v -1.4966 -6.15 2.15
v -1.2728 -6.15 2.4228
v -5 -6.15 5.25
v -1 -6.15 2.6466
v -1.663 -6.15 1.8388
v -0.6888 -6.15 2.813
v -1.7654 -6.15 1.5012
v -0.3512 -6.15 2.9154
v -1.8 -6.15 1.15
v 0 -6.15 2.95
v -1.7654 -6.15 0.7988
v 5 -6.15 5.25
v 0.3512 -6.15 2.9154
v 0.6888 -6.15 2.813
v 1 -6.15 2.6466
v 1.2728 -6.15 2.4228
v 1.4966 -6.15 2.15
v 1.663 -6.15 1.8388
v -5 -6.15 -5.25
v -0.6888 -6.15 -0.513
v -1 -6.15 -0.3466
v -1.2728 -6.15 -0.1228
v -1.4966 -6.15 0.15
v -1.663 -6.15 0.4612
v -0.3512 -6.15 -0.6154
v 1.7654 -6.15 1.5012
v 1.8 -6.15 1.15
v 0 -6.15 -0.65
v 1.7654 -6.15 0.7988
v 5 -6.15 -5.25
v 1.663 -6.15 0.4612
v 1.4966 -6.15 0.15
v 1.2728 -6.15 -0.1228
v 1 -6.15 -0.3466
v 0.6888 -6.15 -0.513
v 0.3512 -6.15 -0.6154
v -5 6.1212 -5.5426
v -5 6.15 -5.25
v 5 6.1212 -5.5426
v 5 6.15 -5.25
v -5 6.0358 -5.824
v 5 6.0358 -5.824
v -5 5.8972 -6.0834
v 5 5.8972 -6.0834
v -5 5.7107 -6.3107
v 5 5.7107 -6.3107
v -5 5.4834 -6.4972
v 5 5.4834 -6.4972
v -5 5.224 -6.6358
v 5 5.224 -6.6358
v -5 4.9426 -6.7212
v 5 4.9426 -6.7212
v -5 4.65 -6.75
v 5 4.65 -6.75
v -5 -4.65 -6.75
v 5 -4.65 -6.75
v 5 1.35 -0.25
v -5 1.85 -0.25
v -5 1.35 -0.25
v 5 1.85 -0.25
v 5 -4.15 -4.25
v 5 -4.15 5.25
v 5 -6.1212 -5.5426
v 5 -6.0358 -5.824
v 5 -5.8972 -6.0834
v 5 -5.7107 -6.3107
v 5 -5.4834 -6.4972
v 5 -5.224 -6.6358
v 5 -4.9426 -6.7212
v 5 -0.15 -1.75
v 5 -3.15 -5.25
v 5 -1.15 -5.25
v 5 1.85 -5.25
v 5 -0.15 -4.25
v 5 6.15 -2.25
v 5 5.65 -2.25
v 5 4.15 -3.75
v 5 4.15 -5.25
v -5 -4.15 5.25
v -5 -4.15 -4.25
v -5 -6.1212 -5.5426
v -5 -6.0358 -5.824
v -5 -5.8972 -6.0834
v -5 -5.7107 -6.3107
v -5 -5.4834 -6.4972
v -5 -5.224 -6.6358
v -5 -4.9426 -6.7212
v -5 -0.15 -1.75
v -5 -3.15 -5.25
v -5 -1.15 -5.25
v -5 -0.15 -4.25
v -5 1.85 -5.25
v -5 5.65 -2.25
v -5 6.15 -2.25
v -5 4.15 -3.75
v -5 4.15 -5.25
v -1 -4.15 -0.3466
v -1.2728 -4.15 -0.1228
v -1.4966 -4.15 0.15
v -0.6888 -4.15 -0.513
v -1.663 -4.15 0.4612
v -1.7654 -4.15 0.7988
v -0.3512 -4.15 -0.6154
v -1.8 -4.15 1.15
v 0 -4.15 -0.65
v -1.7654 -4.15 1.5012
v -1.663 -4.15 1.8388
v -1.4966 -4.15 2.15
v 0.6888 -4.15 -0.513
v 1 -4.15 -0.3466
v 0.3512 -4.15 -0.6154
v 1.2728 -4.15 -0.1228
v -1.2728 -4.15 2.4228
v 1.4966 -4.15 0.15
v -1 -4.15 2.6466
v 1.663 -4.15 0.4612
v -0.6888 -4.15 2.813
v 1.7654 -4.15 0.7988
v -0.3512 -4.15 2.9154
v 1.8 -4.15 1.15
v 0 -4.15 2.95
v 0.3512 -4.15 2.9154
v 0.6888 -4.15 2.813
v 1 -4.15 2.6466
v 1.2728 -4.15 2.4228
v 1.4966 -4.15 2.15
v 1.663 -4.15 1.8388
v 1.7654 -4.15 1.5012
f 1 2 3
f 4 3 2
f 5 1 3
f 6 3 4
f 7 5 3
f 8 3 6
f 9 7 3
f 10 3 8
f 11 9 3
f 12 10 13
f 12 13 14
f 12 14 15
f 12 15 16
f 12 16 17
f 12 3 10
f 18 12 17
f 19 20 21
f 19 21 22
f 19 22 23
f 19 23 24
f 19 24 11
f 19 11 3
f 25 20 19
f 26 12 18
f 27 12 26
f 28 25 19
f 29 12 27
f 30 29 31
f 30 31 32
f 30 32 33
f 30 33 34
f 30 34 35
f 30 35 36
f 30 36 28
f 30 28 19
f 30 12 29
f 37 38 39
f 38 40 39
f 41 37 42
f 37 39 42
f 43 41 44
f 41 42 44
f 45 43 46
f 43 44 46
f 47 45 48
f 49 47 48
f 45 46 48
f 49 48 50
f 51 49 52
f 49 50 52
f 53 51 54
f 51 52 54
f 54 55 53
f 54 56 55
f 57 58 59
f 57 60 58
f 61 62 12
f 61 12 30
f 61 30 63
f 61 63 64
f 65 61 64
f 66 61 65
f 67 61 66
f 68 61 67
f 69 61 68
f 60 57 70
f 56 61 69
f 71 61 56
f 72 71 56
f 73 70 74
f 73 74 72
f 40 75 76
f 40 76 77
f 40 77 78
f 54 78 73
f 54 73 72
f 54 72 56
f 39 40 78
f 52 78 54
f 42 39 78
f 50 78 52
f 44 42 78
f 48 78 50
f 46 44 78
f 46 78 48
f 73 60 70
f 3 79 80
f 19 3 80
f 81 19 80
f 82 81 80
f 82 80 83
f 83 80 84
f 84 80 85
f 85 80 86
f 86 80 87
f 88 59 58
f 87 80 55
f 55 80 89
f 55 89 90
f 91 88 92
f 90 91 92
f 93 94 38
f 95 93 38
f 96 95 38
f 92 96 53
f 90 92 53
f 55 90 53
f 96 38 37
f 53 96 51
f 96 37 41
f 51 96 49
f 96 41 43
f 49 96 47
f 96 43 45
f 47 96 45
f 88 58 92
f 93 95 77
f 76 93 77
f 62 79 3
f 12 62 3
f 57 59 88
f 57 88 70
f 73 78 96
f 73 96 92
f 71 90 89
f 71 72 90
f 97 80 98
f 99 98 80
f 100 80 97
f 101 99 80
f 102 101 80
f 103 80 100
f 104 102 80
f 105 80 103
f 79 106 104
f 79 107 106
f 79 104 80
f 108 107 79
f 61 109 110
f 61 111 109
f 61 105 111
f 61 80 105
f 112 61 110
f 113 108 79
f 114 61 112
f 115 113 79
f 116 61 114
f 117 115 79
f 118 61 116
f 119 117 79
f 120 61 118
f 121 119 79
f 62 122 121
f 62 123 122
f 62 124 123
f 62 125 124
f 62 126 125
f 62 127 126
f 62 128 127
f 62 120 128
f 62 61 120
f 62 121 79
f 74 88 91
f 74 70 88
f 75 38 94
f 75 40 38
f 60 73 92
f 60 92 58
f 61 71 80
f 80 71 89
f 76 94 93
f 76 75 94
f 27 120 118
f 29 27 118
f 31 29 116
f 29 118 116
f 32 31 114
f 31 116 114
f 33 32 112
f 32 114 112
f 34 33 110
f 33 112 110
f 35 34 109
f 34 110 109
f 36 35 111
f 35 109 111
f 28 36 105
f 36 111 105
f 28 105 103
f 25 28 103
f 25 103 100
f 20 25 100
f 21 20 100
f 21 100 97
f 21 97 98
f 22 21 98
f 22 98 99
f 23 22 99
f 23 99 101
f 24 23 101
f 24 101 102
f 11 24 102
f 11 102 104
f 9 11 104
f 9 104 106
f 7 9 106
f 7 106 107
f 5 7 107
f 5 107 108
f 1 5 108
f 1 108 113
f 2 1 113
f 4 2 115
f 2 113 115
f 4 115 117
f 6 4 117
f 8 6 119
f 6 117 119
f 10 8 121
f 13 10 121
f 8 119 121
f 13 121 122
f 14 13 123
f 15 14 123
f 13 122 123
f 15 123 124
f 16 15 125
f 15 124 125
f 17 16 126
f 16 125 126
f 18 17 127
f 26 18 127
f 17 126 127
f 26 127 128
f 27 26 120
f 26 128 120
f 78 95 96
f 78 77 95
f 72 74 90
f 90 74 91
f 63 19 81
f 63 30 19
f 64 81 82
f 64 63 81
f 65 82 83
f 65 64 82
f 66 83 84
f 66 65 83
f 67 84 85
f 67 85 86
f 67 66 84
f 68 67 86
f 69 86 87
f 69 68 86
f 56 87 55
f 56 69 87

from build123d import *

# Parameters (mm, degrees)
BOSS_EXTRUDE1_DEPTH     = 5
CHAMFER1_SIZE           = 1
SKETCH2_R               = 1.8
CUT_EXTRUDE1_DEPTH      = 3
CUT_EXTRUDE1_DEPTH_BACK = 3
FILLET1_R               = 1.5
CHAMFER2_SIZE           = 1.5


with BuildPart() as part:
    # Sketch1 → Boss-Extrude1 (new body, symmetric)
    with BuildSketch(Plane(origin=(0, 0, 0), x_dir=(0, 0, -1), z_dir=(1, 0, 0))):
        Polygon((-5.25, -4.15), (-5.25, -6.15), (6.75, -6.15), (6.75, 6.15), (2.25, 6.15), (2.25, 4.15), (5.25, 4.15), (5.25, 1.85), (0.25, 1.85), (0.25, -0.15), (5.25, -0.15), (5.25, -4.15), align=None)
    extrude(amount=BOSS_EXTRUDE1_DEPTH, both=True)

    # Chamfer1
    chamfer1_edges = [part.edges().sort_by_distance(p)[0] for p in [
        (0, -4.15, -5.25),
        (0, -0.15, -5.25),
    ]]
    chamfer(chamfer1_edges, length=CHAMFER1_SIZE)

    # Sketch2 → Cut-Extrude1 (cut, two sides)
    with BuildSketch(Plane(origin=(0, -4.15, 0), x_dir=(1, 0, 0), z_dir=(0, 1, 0))) as cut_extrude1_sk:
        with Locations((0, -1.15)):
            Circle(SKETCH2_R)
    extrude(amount=CUT_EXTRUDE1_DEPTH, mode=Mode.SUBTRACT)
    extrude(cut_extrude1_sk.sketch, amount=-CUT_EXTRUDE1_DEPTH_BACK, mode=Mode.SUBTRACT)

    # Fillet1
    fillet1_edges = [part.edges().sort_by_distance(p)[0] for p in [
        (0, 6.15, -6.75),
        (0, -6.15, -6.75),
    ]]
    fillet(fillet1_edges, radius=FILLET1_R)

    # Chamfer2
    chamfer2_edges = [part.edges().sort_by_distance(p)[0] for p in [
        (0, 4.15, -2.25),
        (0, -0.15, -0.25),
    ]]
    chamfer(chamfer2_edges, length=CHAMFER2_SIZE)


solid = part.part
